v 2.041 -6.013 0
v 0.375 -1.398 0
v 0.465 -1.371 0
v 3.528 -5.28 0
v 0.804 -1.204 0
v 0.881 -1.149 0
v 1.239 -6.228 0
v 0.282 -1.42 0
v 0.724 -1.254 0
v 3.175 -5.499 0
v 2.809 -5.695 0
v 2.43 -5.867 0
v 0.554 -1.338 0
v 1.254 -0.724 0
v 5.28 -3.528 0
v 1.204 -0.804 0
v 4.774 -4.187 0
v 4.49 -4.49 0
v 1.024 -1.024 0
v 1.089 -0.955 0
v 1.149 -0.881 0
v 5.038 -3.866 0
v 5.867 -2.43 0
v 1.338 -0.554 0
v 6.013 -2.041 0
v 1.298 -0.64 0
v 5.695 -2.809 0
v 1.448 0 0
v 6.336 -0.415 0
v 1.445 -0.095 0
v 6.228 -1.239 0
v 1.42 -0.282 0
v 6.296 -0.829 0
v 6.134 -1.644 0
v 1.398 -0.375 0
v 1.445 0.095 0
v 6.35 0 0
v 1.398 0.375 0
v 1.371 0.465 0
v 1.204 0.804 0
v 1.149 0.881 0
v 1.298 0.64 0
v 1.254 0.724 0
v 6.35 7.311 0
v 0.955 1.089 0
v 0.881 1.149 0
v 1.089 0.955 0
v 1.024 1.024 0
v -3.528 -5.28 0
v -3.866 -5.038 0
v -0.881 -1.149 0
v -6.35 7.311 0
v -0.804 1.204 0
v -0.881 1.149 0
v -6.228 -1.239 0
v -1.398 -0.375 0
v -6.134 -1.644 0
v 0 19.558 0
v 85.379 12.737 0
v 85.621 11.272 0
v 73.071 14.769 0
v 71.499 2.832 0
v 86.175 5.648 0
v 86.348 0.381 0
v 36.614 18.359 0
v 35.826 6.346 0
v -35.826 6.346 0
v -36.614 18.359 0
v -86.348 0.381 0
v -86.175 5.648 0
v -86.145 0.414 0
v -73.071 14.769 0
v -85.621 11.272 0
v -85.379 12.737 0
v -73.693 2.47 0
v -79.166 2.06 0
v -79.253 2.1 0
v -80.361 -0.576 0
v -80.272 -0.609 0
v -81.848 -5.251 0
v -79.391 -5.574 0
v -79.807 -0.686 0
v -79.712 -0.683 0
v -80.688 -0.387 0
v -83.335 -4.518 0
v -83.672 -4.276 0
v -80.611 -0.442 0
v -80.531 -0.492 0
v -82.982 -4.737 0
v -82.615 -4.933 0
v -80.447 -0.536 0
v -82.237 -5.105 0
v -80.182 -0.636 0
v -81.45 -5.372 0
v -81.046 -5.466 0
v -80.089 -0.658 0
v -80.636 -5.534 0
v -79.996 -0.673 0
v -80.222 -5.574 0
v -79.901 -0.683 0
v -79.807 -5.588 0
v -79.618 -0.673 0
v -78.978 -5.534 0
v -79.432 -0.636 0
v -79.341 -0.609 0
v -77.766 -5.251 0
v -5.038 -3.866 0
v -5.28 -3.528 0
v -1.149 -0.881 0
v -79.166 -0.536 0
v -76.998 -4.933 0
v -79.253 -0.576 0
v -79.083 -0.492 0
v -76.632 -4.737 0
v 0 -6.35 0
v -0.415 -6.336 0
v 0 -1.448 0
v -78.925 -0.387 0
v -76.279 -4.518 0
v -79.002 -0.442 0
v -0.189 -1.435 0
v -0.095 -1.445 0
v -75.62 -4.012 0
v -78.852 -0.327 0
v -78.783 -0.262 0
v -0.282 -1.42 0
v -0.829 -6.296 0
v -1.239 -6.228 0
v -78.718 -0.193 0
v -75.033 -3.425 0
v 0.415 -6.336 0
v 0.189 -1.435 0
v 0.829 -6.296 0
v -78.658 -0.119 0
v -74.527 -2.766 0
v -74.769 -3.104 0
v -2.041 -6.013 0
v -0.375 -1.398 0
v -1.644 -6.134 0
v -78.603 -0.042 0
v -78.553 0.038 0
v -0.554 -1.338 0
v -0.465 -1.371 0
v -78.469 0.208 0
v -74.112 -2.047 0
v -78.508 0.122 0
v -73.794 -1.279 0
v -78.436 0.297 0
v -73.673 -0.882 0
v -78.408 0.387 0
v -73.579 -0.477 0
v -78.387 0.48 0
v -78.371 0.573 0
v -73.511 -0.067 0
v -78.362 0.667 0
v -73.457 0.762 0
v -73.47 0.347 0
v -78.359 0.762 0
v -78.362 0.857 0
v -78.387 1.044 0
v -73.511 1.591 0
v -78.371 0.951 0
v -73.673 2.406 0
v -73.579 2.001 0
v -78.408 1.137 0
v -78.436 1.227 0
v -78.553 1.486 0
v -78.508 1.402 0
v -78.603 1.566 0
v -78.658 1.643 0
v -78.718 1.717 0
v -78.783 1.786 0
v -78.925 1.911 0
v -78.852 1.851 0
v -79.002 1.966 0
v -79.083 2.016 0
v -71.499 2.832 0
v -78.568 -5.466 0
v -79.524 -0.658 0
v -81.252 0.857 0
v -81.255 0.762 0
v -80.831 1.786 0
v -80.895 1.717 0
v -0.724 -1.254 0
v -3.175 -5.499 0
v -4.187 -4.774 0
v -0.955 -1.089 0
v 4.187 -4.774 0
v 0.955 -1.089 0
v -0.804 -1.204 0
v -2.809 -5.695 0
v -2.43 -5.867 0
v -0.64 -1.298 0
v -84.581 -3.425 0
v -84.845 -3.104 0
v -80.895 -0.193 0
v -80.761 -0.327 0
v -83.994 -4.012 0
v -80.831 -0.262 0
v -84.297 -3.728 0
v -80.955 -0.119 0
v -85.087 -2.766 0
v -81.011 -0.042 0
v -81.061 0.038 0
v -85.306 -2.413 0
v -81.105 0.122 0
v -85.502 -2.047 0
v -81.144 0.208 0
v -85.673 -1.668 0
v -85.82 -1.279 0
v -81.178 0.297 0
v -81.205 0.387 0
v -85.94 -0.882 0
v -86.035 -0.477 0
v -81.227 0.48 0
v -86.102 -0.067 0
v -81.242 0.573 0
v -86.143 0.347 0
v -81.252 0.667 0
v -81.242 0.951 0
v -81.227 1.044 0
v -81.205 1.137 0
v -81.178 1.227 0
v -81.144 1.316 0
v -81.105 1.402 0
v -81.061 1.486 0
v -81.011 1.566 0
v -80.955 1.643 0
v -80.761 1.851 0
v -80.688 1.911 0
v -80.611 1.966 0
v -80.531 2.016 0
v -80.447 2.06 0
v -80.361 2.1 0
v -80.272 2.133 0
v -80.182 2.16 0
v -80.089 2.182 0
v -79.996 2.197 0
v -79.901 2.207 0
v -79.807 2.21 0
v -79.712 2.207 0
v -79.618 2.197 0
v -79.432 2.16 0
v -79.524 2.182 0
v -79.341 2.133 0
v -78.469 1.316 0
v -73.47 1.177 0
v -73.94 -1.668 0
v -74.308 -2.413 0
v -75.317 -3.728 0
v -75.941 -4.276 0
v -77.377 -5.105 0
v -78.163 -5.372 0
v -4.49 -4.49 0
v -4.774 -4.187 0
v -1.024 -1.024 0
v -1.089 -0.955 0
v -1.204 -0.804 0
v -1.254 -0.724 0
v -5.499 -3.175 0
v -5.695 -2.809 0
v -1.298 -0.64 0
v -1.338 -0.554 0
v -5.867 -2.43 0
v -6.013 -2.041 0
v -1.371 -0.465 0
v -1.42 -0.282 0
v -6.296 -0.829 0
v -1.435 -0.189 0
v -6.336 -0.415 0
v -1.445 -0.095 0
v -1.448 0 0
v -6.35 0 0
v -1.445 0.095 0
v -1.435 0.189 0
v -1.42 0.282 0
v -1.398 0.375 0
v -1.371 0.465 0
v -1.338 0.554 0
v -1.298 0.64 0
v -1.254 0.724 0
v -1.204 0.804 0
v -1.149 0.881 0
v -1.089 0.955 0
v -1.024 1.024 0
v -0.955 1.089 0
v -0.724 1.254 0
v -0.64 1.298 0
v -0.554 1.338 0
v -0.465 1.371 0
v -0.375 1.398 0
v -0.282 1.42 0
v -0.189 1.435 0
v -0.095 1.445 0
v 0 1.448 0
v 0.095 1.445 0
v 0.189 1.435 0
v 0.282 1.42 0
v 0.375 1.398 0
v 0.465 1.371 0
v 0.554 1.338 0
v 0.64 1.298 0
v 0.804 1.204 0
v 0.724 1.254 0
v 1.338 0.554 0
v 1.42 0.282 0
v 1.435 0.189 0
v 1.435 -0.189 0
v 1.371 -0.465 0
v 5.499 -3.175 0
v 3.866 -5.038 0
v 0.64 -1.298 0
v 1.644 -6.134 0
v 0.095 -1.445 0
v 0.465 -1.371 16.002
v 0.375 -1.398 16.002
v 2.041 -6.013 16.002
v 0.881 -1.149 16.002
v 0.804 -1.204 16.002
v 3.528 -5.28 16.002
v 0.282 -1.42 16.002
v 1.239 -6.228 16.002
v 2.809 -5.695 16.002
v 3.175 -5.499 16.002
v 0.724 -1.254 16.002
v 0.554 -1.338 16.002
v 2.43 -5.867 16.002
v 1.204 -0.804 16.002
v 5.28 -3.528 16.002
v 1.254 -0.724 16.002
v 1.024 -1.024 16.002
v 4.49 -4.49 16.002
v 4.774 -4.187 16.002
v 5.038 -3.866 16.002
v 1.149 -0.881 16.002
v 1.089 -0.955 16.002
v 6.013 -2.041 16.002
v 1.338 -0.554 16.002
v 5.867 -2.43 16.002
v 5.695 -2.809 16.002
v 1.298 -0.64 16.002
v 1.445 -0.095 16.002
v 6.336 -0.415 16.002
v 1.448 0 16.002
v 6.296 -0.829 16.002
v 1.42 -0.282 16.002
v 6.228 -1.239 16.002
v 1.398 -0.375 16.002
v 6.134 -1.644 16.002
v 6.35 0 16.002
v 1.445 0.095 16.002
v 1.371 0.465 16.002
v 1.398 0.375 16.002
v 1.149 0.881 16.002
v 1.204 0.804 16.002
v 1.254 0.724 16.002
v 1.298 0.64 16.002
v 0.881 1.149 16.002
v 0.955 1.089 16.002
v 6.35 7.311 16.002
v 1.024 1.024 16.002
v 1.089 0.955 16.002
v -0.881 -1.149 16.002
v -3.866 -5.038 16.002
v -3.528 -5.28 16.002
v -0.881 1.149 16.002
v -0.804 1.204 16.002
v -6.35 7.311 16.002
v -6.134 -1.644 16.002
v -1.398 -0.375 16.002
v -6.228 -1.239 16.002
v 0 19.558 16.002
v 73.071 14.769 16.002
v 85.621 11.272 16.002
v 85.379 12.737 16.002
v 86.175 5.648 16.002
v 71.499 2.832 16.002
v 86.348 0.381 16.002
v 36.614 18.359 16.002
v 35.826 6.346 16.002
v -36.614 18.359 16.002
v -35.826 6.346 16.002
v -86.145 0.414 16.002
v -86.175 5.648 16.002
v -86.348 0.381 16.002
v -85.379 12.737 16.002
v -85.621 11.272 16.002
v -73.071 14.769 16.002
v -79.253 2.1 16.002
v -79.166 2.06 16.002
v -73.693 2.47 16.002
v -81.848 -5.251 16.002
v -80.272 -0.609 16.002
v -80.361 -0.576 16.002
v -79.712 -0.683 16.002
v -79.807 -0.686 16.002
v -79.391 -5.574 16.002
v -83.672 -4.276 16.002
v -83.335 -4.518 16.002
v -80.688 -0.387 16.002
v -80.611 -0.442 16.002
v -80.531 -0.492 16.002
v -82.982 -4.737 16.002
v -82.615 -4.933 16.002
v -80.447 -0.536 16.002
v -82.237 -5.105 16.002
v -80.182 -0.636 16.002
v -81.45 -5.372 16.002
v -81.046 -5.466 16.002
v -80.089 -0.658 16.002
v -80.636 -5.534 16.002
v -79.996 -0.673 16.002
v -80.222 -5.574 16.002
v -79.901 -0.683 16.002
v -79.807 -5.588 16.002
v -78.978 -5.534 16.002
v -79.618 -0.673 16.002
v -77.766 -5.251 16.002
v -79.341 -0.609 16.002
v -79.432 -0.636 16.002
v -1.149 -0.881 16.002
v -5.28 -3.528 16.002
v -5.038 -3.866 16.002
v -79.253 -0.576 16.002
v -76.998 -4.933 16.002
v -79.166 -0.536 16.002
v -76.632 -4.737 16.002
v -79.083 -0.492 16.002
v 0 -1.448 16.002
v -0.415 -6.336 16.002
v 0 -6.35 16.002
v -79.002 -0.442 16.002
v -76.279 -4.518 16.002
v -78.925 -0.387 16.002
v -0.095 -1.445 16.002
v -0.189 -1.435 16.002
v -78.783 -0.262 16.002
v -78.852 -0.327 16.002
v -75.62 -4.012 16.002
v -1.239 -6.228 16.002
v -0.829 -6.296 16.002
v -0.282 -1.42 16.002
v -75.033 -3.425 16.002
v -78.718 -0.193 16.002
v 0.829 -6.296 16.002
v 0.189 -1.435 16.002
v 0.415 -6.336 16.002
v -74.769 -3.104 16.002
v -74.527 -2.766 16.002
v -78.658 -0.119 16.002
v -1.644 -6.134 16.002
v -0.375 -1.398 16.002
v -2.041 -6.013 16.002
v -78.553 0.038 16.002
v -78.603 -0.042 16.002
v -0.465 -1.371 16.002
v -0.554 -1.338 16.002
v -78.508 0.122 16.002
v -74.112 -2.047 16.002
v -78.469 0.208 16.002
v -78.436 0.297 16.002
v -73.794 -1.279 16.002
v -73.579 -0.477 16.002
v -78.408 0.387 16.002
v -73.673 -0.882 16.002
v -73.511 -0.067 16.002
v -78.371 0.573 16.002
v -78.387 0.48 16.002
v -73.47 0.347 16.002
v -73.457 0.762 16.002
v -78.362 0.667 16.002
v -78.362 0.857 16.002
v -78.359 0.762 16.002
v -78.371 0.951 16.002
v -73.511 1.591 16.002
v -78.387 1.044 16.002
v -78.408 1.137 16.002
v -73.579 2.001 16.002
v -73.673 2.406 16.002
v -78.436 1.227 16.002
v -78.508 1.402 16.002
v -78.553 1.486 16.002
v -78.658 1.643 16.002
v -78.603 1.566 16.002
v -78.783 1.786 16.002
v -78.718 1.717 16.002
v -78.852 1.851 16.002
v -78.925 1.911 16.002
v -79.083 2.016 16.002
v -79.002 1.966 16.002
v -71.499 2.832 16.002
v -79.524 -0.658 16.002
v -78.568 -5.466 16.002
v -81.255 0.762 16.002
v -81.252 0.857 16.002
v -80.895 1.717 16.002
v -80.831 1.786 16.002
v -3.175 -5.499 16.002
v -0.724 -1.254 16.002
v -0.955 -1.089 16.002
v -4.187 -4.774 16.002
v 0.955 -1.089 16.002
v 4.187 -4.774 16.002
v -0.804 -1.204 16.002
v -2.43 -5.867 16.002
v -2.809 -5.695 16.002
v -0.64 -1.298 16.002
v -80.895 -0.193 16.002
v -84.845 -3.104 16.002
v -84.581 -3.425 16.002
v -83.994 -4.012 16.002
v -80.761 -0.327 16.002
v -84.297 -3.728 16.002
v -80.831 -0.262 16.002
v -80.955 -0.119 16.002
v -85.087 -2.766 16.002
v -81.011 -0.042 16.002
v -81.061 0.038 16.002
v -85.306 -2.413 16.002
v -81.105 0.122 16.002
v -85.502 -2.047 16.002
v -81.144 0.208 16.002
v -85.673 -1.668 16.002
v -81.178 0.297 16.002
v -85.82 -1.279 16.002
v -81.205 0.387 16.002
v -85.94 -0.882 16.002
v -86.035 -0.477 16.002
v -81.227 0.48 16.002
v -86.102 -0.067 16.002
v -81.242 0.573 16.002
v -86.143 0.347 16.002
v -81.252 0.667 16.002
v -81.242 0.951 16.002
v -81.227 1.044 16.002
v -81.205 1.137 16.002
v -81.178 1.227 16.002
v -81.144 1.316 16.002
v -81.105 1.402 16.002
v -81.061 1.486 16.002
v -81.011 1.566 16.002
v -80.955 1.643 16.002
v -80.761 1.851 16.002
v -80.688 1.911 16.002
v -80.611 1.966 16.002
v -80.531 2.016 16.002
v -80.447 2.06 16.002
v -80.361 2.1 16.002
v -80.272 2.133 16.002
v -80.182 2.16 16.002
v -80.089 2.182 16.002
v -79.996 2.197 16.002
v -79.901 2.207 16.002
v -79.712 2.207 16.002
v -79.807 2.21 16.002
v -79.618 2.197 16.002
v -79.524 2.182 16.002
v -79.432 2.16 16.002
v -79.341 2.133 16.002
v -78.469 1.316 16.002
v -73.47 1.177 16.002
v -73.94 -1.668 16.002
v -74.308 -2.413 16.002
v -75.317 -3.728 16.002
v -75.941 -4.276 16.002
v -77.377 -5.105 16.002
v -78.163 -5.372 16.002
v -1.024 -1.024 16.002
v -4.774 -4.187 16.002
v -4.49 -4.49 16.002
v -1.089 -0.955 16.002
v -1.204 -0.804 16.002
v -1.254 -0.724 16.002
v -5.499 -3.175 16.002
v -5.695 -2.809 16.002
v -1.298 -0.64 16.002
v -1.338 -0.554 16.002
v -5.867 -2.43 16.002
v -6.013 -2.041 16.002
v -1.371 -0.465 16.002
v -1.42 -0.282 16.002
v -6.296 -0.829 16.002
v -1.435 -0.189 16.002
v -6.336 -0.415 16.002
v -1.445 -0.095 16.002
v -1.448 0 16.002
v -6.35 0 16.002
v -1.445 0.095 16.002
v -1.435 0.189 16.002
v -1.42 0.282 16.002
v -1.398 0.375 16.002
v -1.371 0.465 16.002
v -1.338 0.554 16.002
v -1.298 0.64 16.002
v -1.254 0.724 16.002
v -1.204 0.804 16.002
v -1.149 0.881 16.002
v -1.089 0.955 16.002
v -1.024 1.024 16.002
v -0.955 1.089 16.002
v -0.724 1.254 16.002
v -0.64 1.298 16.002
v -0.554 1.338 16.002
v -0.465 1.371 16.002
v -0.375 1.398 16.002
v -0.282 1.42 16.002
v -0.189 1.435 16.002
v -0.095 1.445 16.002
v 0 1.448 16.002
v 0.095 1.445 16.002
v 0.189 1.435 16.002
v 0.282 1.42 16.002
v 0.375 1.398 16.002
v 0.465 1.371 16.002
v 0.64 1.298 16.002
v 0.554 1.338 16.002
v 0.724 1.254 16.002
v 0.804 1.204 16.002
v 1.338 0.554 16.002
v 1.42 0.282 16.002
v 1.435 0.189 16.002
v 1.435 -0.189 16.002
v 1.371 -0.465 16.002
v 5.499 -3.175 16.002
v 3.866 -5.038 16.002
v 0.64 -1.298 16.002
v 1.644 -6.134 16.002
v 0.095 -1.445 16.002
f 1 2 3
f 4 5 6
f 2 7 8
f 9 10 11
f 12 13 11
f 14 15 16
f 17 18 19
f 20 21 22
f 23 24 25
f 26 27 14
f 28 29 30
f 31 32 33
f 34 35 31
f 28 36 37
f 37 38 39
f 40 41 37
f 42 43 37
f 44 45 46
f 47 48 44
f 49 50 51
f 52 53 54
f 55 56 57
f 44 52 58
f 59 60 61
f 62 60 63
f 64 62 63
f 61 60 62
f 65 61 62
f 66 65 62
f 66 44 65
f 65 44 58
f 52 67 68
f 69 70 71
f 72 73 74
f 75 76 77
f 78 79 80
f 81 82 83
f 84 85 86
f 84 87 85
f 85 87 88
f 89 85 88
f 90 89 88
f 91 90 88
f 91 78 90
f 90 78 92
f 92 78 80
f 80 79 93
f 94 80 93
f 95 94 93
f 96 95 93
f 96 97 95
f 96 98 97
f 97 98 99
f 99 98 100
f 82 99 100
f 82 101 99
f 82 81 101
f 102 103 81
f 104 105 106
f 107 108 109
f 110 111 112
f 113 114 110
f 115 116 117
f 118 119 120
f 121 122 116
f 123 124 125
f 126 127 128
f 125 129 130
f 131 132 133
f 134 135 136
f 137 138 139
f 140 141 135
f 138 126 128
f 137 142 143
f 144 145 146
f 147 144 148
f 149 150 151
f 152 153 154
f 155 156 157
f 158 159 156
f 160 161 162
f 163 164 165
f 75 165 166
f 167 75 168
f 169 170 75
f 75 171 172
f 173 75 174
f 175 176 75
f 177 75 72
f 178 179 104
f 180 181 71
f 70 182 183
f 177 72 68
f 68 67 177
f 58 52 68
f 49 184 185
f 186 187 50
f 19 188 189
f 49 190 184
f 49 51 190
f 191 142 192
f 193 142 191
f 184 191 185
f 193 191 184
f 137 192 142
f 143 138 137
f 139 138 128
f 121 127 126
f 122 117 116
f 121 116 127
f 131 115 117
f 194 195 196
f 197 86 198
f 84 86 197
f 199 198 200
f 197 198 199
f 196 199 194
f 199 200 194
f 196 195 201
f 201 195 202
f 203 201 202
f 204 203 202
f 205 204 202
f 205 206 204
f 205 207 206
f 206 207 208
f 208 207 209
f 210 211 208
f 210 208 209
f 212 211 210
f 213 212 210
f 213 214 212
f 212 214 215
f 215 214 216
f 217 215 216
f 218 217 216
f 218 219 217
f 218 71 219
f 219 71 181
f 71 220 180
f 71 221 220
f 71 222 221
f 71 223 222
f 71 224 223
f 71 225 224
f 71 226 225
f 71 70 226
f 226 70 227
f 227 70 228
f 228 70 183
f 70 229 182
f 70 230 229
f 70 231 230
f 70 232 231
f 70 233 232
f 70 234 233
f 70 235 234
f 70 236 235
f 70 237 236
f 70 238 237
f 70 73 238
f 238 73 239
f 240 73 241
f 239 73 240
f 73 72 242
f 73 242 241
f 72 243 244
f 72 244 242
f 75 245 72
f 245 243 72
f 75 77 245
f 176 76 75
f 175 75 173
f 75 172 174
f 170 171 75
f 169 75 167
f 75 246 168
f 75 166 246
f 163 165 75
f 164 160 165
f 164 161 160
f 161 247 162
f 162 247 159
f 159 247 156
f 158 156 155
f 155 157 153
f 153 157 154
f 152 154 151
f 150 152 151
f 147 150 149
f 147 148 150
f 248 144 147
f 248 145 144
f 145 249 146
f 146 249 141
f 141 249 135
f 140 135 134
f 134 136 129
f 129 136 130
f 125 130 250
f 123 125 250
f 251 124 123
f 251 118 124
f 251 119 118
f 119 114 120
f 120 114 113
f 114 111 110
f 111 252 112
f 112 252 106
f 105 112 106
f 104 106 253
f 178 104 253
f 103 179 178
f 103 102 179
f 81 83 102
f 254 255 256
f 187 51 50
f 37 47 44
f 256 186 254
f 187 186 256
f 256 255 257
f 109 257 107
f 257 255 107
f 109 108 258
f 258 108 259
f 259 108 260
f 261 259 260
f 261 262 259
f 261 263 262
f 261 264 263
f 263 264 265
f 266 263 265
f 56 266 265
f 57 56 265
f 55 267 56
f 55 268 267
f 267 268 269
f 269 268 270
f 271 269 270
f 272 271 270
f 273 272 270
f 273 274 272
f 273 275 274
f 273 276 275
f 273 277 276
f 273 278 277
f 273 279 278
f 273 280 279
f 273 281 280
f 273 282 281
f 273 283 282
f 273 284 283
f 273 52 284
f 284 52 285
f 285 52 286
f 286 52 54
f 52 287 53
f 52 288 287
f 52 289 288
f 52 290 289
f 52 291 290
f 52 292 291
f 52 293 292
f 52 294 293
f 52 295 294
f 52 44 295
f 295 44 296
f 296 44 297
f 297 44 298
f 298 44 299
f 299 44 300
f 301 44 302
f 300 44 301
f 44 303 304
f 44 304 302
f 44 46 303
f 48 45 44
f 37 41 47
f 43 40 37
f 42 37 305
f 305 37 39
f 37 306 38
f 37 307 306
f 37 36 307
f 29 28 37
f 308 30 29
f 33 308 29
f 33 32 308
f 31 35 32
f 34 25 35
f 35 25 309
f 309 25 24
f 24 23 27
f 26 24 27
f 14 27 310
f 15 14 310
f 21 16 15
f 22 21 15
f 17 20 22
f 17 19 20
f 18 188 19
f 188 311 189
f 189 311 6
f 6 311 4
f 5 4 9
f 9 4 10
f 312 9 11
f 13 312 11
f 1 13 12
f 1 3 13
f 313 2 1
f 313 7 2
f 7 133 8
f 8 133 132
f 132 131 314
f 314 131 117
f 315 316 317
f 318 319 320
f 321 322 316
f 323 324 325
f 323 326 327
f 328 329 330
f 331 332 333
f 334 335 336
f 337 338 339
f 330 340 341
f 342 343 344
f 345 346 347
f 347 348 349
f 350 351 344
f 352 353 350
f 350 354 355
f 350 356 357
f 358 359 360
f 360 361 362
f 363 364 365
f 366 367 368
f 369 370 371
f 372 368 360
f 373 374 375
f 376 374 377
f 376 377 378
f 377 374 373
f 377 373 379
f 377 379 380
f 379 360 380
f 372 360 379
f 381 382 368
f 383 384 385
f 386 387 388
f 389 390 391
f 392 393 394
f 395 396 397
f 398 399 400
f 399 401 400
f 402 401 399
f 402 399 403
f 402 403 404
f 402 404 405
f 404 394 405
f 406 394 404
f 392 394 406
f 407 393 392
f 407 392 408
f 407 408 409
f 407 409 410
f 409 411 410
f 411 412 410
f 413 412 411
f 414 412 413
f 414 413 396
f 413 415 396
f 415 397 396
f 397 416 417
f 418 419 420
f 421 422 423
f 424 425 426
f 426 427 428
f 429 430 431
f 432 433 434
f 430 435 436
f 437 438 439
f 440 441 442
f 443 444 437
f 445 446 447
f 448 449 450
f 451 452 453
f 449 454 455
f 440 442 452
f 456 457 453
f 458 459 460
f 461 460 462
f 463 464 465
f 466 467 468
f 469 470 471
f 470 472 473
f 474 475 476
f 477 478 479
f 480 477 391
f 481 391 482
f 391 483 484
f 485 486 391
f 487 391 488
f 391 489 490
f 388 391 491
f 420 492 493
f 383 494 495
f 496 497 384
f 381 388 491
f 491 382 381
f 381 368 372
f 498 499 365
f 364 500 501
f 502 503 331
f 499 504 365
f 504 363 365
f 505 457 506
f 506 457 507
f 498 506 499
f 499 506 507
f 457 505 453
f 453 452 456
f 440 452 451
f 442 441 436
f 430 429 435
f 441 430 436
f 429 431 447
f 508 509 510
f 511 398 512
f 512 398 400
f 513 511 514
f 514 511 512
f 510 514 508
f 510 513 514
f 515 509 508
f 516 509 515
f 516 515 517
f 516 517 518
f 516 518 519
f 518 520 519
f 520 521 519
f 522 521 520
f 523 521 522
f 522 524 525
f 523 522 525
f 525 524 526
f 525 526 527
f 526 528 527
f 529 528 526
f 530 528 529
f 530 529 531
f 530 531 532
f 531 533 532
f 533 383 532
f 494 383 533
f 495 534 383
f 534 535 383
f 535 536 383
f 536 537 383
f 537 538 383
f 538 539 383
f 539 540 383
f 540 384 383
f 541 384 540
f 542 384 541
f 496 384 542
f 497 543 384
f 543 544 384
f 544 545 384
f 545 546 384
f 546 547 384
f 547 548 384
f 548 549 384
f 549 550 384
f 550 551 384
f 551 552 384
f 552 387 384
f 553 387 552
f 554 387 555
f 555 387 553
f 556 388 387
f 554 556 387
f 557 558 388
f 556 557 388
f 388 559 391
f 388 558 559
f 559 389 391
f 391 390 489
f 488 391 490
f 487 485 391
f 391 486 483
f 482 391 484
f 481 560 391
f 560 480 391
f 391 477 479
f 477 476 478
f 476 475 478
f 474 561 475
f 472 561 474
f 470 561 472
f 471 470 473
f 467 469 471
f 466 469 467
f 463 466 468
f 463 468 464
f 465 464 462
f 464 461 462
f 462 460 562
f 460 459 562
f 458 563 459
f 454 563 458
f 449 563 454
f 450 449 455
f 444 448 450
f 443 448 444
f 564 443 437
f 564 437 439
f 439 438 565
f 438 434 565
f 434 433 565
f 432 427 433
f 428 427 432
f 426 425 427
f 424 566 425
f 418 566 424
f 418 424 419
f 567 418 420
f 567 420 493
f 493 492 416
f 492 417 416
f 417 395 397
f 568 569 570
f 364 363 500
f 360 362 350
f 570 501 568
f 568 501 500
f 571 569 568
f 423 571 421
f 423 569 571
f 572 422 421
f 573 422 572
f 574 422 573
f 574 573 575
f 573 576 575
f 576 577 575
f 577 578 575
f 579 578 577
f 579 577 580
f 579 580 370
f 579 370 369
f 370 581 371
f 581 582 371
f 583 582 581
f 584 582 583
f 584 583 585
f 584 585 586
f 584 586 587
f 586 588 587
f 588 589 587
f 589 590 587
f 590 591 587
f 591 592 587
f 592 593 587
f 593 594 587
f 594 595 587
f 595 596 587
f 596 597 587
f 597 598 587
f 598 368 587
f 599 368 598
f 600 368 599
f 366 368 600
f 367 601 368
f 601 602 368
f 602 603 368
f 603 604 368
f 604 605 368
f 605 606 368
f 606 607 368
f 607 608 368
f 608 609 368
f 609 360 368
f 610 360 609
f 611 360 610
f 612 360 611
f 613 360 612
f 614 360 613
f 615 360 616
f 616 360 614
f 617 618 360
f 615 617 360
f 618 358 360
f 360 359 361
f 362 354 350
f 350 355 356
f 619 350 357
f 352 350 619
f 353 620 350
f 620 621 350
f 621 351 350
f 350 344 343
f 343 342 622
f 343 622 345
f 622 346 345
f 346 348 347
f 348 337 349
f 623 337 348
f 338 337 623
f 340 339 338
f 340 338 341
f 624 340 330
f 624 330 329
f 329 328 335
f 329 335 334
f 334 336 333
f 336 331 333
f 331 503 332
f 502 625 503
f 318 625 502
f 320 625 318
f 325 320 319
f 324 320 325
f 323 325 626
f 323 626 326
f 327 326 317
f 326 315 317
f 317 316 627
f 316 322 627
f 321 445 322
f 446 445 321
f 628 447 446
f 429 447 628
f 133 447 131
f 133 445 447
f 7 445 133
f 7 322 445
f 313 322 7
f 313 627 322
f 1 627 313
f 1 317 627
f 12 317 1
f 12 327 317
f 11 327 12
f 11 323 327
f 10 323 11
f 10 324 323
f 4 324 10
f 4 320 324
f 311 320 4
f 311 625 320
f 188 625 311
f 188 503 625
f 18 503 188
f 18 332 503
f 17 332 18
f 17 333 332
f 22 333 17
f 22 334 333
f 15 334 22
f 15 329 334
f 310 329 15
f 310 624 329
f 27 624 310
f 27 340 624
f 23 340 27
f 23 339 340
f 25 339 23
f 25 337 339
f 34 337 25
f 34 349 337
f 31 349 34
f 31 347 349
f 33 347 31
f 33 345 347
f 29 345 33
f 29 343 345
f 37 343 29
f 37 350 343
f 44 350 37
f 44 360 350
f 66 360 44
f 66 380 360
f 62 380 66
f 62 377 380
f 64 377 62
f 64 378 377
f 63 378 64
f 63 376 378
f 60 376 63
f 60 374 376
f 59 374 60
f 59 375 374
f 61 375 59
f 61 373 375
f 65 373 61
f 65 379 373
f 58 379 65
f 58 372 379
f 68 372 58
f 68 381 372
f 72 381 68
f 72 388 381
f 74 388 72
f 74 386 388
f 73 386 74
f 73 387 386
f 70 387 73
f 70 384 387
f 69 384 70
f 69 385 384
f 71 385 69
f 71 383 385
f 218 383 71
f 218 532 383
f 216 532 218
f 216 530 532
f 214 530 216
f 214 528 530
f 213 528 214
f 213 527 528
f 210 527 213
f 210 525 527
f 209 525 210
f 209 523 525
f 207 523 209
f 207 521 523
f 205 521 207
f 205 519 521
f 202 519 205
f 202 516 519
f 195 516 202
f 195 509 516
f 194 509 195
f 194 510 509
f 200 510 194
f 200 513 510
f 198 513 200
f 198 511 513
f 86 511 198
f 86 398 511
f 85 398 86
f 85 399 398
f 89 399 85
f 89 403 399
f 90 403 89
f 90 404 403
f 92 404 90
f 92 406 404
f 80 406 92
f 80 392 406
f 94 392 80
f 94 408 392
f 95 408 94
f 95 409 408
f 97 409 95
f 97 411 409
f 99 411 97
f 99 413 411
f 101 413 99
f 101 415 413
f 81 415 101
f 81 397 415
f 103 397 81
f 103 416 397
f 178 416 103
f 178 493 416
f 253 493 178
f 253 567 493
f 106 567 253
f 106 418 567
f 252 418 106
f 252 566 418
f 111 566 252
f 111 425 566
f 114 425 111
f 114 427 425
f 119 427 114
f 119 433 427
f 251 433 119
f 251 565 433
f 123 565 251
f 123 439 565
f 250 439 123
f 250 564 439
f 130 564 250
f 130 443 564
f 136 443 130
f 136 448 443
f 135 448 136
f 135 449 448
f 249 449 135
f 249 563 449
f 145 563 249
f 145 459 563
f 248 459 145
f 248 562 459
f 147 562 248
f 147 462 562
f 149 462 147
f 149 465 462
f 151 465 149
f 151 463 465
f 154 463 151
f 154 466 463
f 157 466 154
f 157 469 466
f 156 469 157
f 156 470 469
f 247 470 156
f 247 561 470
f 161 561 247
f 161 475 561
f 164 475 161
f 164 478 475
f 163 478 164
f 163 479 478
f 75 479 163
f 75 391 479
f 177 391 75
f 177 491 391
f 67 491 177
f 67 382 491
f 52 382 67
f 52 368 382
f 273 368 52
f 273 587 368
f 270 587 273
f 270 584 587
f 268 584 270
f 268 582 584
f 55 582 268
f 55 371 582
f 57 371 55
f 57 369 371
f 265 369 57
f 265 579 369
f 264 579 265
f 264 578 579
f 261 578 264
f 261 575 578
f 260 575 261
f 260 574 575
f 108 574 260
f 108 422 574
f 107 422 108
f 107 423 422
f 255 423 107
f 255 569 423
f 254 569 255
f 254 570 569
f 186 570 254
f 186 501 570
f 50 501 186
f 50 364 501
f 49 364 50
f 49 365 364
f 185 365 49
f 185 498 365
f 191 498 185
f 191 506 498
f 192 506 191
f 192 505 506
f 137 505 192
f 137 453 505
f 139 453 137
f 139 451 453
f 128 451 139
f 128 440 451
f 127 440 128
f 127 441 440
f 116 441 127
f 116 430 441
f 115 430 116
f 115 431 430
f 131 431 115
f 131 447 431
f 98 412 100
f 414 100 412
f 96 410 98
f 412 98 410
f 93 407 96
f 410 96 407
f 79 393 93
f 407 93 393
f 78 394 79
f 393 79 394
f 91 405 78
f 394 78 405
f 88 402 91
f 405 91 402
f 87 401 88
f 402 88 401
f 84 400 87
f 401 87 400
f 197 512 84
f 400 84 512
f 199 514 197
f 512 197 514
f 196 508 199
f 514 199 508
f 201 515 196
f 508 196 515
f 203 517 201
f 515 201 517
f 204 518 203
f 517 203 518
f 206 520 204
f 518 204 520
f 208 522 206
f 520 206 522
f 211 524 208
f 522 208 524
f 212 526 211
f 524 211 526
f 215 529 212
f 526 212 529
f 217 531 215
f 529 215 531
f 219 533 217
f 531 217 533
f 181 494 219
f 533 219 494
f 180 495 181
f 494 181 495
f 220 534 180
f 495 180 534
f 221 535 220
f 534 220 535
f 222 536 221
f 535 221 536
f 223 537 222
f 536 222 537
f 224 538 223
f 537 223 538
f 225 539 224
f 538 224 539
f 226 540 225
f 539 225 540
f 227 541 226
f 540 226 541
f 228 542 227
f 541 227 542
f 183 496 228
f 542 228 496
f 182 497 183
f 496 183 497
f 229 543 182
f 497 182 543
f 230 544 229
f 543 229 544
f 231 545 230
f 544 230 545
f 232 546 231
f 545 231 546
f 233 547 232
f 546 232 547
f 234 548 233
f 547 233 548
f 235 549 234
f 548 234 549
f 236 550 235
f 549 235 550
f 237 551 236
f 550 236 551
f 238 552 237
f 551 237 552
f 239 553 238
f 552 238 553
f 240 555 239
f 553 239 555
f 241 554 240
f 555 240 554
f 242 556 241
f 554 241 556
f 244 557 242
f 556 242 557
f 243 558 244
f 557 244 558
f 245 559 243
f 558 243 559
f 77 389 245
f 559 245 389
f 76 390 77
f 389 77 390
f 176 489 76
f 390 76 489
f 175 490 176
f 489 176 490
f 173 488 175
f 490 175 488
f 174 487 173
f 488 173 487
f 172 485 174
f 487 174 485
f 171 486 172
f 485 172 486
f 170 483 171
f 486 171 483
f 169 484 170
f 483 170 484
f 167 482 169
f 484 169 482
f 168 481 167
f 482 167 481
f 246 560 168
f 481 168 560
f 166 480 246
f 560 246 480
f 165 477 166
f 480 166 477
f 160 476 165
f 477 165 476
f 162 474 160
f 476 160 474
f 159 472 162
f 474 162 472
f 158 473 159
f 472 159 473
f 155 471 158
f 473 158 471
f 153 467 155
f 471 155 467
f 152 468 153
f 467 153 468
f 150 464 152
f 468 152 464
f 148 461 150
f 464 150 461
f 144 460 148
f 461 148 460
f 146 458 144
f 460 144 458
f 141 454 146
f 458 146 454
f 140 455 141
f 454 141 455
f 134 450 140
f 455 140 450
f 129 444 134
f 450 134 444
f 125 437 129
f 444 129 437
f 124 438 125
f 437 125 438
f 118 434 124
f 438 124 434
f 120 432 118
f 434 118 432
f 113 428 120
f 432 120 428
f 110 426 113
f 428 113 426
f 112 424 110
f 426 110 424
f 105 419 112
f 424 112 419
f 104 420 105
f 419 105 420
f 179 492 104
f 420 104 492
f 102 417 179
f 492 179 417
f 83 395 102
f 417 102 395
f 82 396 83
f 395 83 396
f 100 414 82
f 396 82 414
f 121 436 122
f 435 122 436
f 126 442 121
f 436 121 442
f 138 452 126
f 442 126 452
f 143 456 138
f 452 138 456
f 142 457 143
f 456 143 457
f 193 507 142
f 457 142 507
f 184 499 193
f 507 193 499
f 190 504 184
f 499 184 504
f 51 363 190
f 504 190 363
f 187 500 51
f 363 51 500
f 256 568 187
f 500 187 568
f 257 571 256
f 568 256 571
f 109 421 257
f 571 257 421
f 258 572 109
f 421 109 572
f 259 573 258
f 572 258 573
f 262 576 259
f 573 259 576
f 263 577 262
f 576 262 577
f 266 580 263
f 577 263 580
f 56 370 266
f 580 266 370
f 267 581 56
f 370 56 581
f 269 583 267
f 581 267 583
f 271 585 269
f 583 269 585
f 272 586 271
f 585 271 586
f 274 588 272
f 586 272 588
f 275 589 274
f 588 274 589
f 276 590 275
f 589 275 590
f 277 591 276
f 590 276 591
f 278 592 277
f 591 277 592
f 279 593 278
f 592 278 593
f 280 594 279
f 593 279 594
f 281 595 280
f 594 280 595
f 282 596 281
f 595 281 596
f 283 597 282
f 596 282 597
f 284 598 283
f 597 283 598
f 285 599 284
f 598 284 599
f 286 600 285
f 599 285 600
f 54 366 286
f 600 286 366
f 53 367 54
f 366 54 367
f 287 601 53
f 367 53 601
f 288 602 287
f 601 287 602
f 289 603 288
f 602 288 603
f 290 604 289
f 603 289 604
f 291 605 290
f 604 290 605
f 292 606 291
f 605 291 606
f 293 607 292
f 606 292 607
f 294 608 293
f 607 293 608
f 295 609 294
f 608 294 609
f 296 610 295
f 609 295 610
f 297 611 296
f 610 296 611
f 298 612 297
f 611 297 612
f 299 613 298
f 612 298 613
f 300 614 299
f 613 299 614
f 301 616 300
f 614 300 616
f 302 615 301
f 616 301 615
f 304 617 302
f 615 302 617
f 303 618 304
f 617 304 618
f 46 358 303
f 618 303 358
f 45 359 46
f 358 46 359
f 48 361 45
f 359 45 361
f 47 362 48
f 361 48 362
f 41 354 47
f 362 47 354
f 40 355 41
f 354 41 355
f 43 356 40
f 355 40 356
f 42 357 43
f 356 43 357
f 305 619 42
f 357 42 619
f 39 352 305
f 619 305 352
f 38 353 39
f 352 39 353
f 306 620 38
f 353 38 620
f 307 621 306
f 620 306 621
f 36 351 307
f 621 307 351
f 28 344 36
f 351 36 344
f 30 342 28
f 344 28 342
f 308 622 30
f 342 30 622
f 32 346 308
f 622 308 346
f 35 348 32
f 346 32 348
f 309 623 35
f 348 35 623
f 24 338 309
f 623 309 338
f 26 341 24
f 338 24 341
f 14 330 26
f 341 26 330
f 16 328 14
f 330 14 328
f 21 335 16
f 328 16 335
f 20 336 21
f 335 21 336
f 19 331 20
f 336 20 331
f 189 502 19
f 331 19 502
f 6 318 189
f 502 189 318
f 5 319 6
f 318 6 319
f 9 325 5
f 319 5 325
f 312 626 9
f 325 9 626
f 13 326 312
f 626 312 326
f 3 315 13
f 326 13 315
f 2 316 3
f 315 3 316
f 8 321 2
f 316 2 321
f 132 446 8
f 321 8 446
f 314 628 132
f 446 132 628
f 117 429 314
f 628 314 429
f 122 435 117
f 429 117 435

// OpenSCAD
ViewScale = [0.0254, 0.0254, 0.0254];

module model_handle()
{
    bigcircle=22040;
    thickness=474;
    linear_extrude(630)
    intersection() {
    circle(3400, $fn=96);
    difference() {
        union() {
            translate([0, -bigcircle+770, 0])
            difference() {
                circle(bigcircle, $fn=96);
                circle(bigcircle-thickness, $fn=96);
            }
            translate([-3142,30,0])
            circle(500/2, $fn=96);
            hull() {
                circle(500/2, $fn=96);
                translate([0, 500, 0])
                circle(500/2, $fn=96);
            }
        }
        circle(114/2, $fn=96);
        translate([-3142,30,0])
        circle(114/2, $fn=96);
    }
    }
}

module template()
{
}

module forViewing()
{
    model_handle();
}

module forPrinting()
{
}

scale(ViewScale)
{
    forViewing();
}
